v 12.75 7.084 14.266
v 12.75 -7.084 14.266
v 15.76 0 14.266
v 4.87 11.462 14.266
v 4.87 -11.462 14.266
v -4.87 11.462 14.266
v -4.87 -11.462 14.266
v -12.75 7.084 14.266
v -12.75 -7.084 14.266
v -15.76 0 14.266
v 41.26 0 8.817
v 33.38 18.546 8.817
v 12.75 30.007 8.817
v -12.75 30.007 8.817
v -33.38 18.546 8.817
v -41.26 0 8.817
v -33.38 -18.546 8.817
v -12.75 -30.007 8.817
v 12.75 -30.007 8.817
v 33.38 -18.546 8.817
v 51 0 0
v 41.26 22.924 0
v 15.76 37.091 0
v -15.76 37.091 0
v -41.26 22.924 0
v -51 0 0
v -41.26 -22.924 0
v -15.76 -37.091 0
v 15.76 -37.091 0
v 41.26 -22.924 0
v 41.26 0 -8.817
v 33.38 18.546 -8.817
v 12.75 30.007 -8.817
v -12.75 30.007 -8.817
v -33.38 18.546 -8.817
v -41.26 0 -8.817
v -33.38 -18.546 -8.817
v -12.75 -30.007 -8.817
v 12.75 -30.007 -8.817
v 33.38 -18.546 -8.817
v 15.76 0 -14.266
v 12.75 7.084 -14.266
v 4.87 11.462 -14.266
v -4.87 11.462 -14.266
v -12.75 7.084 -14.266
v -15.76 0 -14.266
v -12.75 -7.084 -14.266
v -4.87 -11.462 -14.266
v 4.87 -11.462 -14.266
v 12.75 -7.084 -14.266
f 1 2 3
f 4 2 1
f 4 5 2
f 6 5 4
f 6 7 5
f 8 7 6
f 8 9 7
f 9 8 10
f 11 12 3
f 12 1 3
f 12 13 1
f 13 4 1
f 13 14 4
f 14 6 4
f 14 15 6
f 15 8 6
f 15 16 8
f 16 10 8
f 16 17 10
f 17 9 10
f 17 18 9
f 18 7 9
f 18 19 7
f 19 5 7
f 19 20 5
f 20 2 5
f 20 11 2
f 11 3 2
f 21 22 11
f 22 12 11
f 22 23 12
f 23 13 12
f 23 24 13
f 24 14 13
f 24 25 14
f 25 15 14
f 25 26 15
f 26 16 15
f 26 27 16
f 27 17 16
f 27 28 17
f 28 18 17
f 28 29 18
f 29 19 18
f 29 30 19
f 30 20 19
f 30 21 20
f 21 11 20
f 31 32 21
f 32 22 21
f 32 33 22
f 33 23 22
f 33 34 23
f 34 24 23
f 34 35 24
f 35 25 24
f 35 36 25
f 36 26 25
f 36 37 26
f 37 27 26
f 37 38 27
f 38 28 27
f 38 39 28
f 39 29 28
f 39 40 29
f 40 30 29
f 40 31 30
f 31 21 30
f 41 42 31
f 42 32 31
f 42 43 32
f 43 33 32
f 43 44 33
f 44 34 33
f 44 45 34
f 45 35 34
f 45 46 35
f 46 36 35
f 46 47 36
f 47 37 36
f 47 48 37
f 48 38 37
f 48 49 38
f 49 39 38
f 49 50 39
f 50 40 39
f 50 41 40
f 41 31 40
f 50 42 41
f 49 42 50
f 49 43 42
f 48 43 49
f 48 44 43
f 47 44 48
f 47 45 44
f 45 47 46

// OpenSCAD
// Generated by SolidPython 1.0.1 on 2020-07-29 00:46:53


scale(v = [17, 13, 5]) {
	sphere(r = 3);
}
/***********************************************
*********      SolidPython code:      **********
************************************************
 
# import packages: SolidPython
from solid import *
from solid.utils import *
from itertools import chain, combinations, permutations


class Resize:

    def __init__(self, scad_file):
        self.scad_file = scad_file
        #self.scad_file = import_scad(scad_file)
        # cone/cylinder param:
        self.r1 = 0
        self.r2 = 0
        self.h = 0
        # rectangular prism param:
        self.w = 0
        self.l = 0
        # ellipse param:
        self.r = 0

    # import OpenScad code (file name corresponds to shape)


    # classify shape + parameters
    def assign(self, param1, param2, param3):
        if self.scad_file == 'cone.scad':
            self.r1 = param1
            self.r2 = param2
            self.h = param3
        elif self.scad_file == 'cylinder.scad':
            self.r1 = param1
            self.r2 = param2
            self.h = param3
        elif self.scad_file == 'rectangularPrism.scad':
            self.h = param1
            self.l = param2
            self.w = param3
        else:
            self.r = param1
            self.h = param2

    # resize parameters
    def iterate(self):
        x = range(3, 20, 2)
        i = 1
        if self.scad_file == 'cone.scad':
            tempList = list(permutations(x, 2))
            for temp in tempList:
                param1 = temp[0]
                param2 = temp[1]
                filepath = 'produced_scad_files/' + 'cone' + str(param1) + '_' + str(param2) + '_' + '.scad'
                scad_render_to_file(cylinder(h=param1, r1=param2, r2=0), filepath)

        elif self.scad_file == 'cylinder.scad':
            tempList = list(permutations(x, 3))
            for temp in tempList:
                param1 = temp[0]
                param2 = temp[1]
                filepath = 'produced_scad_files/' + 'cylinder' + str(param1) + '_' + str(param2) + '_' + '.scad'
                scad_render_to_file(cylinder(h=param1, r1=param2, r2=param2), filepath)

        elif self.scad_file == 'rectangularPrism.scad':
            tempList = list(permutations(x, 3))
            for temp in tempList:
                param1 = temp[0]
                param2 = temp[1]
                param3 = temp[2]
                filepath = 'produced_scad_files/' + 'rectangularPrism' + str(param1) + '_' + str(param2) + '_' + str(
                    param3) + '.scad'
                scad_render_to_file(cube(size=(param1, param2, param3)), filepath)

        elif self.scad_file == 'ellipse.scad':
            tempList = list(permutations(x, 4))
            for temp in tempList:
                param1 = temp[0]
                param2 = temp[1]
                param3 = temp[2]
                param4 = temp[3]
                filepath = 'produced_scad_files/' + 'ellipse' + str(param1) + '_' + str(param2) + '_' + str(param3) + '_' + str(param4) + '.scad'
                scad_render_to_file(scale([param1, param2, param3])(sphere(r=param4)), filepath)

    def render_to_scadfile(self):
        scad_render_to_file(scad, 'example.scad') 
 
************************************************/
